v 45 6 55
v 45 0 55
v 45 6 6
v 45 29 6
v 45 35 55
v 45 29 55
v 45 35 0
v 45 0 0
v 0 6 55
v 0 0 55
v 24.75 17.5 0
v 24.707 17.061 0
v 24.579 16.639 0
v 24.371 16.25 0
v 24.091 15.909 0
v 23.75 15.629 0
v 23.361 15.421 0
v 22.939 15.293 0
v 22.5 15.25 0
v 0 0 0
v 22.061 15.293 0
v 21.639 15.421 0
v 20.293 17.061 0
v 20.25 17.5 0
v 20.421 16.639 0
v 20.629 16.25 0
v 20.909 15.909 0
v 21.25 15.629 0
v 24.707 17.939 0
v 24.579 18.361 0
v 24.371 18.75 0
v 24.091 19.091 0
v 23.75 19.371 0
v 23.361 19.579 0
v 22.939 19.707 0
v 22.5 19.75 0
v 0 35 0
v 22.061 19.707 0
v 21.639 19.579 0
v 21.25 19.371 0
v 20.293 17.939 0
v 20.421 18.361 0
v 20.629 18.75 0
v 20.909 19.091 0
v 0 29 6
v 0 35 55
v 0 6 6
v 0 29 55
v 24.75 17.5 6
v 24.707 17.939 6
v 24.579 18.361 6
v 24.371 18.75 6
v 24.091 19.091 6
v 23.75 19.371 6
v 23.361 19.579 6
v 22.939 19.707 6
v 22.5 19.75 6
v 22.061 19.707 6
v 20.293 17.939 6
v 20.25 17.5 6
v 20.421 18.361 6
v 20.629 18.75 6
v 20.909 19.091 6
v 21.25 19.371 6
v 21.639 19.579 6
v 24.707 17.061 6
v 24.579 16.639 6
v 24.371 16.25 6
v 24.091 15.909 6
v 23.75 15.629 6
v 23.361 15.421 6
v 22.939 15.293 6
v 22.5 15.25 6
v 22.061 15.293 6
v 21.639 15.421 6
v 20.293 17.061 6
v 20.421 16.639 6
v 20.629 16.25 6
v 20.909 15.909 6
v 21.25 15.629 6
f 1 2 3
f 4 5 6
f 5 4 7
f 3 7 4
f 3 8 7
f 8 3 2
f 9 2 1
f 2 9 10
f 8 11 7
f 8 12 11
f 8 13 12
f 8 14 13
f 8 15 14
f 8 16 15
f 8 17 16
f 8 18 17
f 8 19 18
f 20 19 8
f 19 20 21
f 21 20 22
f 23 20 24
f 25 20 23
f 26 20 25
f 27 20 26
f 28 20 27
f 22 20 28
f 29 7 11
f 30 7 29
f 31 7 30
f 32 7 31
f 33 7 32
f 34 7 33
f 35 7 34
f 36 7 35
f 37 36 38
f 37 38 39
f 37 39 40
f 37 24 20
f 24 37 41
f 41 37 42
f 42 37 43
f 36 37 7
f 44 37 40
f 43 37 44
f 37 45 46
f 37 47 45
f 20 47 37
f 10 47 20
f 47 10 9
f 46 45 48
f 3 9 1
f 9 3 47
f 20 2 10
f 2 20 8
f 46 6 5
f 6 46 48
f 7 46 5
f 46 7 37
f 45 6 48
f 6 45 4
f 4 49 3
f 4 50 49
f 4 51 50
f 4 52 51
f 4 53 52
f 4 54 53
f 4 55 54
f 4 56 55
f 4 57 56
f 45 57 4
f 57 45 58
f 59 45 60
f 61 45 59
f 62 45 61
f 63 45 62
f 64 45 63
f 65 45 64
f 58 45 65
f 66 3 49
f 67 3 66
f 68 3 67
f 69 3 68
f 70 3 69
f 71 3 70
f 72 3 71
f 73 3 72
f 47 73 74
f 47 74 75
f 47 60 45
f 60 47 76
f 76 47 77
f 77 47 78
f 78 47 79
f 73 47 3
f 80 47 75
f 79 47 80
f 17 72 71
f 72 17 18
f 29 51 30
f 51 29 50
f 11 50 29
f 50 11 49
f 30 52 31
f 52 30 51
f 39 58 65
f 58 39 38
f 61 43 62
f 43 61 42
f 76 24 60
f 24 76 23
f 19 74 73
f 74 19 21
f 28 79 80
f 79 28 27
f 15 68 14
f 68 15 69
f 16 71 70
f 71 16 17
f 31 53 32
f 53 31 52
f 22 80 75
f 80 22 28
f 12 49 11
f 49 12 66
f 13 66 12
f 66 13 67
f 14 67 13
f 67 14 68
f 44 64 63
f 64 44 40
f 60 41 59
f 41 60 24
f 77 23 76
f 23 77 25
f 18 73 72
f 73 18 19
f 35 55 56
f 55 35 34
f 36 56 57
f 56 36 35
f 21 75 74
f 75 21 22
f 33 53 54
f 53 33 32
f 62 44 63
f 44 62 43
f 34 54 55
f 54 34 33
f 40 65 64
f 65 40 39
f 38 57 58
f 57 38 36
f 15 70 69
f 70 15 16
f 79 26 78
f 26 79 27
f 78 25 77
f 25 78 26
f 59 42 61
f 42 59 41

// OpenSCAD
$fn = 32;

// ----------------------------------------------------------------------
// U-bracket: 45 x 35 x 55 mm
// ----------------------------------------------------------------------

// --- parameters (mm) ---
length = 45;              // outer length, X
width = 35;               // outer width, Y
height = 55;              // upright height, Z
thick = 6;                // wall thickness
hole_d = 4.5;             // clearance for M4

module hole_z(px, py) {
  translate([px, py, -0.5]) cylinder(h = thick + 1, d = hole_d);
}
module hole_y_pz(pz) {
  /* through both uprights along Y */
  translate([0, -0.5, pz]) rotate([-90, 0, 0]) cylinder(h = width + 1, d = hole_d);
}

module base() {
  cube([length, width, thick]);
}

module uprights() {
  cube([length, thick, height]);
  translate([0, width - thick, 0]) cube([length, thick, height]);
}

difference() {
  union() {
    base();
    uprights();
  }
  hole_z(22.5, 17.5);
}
